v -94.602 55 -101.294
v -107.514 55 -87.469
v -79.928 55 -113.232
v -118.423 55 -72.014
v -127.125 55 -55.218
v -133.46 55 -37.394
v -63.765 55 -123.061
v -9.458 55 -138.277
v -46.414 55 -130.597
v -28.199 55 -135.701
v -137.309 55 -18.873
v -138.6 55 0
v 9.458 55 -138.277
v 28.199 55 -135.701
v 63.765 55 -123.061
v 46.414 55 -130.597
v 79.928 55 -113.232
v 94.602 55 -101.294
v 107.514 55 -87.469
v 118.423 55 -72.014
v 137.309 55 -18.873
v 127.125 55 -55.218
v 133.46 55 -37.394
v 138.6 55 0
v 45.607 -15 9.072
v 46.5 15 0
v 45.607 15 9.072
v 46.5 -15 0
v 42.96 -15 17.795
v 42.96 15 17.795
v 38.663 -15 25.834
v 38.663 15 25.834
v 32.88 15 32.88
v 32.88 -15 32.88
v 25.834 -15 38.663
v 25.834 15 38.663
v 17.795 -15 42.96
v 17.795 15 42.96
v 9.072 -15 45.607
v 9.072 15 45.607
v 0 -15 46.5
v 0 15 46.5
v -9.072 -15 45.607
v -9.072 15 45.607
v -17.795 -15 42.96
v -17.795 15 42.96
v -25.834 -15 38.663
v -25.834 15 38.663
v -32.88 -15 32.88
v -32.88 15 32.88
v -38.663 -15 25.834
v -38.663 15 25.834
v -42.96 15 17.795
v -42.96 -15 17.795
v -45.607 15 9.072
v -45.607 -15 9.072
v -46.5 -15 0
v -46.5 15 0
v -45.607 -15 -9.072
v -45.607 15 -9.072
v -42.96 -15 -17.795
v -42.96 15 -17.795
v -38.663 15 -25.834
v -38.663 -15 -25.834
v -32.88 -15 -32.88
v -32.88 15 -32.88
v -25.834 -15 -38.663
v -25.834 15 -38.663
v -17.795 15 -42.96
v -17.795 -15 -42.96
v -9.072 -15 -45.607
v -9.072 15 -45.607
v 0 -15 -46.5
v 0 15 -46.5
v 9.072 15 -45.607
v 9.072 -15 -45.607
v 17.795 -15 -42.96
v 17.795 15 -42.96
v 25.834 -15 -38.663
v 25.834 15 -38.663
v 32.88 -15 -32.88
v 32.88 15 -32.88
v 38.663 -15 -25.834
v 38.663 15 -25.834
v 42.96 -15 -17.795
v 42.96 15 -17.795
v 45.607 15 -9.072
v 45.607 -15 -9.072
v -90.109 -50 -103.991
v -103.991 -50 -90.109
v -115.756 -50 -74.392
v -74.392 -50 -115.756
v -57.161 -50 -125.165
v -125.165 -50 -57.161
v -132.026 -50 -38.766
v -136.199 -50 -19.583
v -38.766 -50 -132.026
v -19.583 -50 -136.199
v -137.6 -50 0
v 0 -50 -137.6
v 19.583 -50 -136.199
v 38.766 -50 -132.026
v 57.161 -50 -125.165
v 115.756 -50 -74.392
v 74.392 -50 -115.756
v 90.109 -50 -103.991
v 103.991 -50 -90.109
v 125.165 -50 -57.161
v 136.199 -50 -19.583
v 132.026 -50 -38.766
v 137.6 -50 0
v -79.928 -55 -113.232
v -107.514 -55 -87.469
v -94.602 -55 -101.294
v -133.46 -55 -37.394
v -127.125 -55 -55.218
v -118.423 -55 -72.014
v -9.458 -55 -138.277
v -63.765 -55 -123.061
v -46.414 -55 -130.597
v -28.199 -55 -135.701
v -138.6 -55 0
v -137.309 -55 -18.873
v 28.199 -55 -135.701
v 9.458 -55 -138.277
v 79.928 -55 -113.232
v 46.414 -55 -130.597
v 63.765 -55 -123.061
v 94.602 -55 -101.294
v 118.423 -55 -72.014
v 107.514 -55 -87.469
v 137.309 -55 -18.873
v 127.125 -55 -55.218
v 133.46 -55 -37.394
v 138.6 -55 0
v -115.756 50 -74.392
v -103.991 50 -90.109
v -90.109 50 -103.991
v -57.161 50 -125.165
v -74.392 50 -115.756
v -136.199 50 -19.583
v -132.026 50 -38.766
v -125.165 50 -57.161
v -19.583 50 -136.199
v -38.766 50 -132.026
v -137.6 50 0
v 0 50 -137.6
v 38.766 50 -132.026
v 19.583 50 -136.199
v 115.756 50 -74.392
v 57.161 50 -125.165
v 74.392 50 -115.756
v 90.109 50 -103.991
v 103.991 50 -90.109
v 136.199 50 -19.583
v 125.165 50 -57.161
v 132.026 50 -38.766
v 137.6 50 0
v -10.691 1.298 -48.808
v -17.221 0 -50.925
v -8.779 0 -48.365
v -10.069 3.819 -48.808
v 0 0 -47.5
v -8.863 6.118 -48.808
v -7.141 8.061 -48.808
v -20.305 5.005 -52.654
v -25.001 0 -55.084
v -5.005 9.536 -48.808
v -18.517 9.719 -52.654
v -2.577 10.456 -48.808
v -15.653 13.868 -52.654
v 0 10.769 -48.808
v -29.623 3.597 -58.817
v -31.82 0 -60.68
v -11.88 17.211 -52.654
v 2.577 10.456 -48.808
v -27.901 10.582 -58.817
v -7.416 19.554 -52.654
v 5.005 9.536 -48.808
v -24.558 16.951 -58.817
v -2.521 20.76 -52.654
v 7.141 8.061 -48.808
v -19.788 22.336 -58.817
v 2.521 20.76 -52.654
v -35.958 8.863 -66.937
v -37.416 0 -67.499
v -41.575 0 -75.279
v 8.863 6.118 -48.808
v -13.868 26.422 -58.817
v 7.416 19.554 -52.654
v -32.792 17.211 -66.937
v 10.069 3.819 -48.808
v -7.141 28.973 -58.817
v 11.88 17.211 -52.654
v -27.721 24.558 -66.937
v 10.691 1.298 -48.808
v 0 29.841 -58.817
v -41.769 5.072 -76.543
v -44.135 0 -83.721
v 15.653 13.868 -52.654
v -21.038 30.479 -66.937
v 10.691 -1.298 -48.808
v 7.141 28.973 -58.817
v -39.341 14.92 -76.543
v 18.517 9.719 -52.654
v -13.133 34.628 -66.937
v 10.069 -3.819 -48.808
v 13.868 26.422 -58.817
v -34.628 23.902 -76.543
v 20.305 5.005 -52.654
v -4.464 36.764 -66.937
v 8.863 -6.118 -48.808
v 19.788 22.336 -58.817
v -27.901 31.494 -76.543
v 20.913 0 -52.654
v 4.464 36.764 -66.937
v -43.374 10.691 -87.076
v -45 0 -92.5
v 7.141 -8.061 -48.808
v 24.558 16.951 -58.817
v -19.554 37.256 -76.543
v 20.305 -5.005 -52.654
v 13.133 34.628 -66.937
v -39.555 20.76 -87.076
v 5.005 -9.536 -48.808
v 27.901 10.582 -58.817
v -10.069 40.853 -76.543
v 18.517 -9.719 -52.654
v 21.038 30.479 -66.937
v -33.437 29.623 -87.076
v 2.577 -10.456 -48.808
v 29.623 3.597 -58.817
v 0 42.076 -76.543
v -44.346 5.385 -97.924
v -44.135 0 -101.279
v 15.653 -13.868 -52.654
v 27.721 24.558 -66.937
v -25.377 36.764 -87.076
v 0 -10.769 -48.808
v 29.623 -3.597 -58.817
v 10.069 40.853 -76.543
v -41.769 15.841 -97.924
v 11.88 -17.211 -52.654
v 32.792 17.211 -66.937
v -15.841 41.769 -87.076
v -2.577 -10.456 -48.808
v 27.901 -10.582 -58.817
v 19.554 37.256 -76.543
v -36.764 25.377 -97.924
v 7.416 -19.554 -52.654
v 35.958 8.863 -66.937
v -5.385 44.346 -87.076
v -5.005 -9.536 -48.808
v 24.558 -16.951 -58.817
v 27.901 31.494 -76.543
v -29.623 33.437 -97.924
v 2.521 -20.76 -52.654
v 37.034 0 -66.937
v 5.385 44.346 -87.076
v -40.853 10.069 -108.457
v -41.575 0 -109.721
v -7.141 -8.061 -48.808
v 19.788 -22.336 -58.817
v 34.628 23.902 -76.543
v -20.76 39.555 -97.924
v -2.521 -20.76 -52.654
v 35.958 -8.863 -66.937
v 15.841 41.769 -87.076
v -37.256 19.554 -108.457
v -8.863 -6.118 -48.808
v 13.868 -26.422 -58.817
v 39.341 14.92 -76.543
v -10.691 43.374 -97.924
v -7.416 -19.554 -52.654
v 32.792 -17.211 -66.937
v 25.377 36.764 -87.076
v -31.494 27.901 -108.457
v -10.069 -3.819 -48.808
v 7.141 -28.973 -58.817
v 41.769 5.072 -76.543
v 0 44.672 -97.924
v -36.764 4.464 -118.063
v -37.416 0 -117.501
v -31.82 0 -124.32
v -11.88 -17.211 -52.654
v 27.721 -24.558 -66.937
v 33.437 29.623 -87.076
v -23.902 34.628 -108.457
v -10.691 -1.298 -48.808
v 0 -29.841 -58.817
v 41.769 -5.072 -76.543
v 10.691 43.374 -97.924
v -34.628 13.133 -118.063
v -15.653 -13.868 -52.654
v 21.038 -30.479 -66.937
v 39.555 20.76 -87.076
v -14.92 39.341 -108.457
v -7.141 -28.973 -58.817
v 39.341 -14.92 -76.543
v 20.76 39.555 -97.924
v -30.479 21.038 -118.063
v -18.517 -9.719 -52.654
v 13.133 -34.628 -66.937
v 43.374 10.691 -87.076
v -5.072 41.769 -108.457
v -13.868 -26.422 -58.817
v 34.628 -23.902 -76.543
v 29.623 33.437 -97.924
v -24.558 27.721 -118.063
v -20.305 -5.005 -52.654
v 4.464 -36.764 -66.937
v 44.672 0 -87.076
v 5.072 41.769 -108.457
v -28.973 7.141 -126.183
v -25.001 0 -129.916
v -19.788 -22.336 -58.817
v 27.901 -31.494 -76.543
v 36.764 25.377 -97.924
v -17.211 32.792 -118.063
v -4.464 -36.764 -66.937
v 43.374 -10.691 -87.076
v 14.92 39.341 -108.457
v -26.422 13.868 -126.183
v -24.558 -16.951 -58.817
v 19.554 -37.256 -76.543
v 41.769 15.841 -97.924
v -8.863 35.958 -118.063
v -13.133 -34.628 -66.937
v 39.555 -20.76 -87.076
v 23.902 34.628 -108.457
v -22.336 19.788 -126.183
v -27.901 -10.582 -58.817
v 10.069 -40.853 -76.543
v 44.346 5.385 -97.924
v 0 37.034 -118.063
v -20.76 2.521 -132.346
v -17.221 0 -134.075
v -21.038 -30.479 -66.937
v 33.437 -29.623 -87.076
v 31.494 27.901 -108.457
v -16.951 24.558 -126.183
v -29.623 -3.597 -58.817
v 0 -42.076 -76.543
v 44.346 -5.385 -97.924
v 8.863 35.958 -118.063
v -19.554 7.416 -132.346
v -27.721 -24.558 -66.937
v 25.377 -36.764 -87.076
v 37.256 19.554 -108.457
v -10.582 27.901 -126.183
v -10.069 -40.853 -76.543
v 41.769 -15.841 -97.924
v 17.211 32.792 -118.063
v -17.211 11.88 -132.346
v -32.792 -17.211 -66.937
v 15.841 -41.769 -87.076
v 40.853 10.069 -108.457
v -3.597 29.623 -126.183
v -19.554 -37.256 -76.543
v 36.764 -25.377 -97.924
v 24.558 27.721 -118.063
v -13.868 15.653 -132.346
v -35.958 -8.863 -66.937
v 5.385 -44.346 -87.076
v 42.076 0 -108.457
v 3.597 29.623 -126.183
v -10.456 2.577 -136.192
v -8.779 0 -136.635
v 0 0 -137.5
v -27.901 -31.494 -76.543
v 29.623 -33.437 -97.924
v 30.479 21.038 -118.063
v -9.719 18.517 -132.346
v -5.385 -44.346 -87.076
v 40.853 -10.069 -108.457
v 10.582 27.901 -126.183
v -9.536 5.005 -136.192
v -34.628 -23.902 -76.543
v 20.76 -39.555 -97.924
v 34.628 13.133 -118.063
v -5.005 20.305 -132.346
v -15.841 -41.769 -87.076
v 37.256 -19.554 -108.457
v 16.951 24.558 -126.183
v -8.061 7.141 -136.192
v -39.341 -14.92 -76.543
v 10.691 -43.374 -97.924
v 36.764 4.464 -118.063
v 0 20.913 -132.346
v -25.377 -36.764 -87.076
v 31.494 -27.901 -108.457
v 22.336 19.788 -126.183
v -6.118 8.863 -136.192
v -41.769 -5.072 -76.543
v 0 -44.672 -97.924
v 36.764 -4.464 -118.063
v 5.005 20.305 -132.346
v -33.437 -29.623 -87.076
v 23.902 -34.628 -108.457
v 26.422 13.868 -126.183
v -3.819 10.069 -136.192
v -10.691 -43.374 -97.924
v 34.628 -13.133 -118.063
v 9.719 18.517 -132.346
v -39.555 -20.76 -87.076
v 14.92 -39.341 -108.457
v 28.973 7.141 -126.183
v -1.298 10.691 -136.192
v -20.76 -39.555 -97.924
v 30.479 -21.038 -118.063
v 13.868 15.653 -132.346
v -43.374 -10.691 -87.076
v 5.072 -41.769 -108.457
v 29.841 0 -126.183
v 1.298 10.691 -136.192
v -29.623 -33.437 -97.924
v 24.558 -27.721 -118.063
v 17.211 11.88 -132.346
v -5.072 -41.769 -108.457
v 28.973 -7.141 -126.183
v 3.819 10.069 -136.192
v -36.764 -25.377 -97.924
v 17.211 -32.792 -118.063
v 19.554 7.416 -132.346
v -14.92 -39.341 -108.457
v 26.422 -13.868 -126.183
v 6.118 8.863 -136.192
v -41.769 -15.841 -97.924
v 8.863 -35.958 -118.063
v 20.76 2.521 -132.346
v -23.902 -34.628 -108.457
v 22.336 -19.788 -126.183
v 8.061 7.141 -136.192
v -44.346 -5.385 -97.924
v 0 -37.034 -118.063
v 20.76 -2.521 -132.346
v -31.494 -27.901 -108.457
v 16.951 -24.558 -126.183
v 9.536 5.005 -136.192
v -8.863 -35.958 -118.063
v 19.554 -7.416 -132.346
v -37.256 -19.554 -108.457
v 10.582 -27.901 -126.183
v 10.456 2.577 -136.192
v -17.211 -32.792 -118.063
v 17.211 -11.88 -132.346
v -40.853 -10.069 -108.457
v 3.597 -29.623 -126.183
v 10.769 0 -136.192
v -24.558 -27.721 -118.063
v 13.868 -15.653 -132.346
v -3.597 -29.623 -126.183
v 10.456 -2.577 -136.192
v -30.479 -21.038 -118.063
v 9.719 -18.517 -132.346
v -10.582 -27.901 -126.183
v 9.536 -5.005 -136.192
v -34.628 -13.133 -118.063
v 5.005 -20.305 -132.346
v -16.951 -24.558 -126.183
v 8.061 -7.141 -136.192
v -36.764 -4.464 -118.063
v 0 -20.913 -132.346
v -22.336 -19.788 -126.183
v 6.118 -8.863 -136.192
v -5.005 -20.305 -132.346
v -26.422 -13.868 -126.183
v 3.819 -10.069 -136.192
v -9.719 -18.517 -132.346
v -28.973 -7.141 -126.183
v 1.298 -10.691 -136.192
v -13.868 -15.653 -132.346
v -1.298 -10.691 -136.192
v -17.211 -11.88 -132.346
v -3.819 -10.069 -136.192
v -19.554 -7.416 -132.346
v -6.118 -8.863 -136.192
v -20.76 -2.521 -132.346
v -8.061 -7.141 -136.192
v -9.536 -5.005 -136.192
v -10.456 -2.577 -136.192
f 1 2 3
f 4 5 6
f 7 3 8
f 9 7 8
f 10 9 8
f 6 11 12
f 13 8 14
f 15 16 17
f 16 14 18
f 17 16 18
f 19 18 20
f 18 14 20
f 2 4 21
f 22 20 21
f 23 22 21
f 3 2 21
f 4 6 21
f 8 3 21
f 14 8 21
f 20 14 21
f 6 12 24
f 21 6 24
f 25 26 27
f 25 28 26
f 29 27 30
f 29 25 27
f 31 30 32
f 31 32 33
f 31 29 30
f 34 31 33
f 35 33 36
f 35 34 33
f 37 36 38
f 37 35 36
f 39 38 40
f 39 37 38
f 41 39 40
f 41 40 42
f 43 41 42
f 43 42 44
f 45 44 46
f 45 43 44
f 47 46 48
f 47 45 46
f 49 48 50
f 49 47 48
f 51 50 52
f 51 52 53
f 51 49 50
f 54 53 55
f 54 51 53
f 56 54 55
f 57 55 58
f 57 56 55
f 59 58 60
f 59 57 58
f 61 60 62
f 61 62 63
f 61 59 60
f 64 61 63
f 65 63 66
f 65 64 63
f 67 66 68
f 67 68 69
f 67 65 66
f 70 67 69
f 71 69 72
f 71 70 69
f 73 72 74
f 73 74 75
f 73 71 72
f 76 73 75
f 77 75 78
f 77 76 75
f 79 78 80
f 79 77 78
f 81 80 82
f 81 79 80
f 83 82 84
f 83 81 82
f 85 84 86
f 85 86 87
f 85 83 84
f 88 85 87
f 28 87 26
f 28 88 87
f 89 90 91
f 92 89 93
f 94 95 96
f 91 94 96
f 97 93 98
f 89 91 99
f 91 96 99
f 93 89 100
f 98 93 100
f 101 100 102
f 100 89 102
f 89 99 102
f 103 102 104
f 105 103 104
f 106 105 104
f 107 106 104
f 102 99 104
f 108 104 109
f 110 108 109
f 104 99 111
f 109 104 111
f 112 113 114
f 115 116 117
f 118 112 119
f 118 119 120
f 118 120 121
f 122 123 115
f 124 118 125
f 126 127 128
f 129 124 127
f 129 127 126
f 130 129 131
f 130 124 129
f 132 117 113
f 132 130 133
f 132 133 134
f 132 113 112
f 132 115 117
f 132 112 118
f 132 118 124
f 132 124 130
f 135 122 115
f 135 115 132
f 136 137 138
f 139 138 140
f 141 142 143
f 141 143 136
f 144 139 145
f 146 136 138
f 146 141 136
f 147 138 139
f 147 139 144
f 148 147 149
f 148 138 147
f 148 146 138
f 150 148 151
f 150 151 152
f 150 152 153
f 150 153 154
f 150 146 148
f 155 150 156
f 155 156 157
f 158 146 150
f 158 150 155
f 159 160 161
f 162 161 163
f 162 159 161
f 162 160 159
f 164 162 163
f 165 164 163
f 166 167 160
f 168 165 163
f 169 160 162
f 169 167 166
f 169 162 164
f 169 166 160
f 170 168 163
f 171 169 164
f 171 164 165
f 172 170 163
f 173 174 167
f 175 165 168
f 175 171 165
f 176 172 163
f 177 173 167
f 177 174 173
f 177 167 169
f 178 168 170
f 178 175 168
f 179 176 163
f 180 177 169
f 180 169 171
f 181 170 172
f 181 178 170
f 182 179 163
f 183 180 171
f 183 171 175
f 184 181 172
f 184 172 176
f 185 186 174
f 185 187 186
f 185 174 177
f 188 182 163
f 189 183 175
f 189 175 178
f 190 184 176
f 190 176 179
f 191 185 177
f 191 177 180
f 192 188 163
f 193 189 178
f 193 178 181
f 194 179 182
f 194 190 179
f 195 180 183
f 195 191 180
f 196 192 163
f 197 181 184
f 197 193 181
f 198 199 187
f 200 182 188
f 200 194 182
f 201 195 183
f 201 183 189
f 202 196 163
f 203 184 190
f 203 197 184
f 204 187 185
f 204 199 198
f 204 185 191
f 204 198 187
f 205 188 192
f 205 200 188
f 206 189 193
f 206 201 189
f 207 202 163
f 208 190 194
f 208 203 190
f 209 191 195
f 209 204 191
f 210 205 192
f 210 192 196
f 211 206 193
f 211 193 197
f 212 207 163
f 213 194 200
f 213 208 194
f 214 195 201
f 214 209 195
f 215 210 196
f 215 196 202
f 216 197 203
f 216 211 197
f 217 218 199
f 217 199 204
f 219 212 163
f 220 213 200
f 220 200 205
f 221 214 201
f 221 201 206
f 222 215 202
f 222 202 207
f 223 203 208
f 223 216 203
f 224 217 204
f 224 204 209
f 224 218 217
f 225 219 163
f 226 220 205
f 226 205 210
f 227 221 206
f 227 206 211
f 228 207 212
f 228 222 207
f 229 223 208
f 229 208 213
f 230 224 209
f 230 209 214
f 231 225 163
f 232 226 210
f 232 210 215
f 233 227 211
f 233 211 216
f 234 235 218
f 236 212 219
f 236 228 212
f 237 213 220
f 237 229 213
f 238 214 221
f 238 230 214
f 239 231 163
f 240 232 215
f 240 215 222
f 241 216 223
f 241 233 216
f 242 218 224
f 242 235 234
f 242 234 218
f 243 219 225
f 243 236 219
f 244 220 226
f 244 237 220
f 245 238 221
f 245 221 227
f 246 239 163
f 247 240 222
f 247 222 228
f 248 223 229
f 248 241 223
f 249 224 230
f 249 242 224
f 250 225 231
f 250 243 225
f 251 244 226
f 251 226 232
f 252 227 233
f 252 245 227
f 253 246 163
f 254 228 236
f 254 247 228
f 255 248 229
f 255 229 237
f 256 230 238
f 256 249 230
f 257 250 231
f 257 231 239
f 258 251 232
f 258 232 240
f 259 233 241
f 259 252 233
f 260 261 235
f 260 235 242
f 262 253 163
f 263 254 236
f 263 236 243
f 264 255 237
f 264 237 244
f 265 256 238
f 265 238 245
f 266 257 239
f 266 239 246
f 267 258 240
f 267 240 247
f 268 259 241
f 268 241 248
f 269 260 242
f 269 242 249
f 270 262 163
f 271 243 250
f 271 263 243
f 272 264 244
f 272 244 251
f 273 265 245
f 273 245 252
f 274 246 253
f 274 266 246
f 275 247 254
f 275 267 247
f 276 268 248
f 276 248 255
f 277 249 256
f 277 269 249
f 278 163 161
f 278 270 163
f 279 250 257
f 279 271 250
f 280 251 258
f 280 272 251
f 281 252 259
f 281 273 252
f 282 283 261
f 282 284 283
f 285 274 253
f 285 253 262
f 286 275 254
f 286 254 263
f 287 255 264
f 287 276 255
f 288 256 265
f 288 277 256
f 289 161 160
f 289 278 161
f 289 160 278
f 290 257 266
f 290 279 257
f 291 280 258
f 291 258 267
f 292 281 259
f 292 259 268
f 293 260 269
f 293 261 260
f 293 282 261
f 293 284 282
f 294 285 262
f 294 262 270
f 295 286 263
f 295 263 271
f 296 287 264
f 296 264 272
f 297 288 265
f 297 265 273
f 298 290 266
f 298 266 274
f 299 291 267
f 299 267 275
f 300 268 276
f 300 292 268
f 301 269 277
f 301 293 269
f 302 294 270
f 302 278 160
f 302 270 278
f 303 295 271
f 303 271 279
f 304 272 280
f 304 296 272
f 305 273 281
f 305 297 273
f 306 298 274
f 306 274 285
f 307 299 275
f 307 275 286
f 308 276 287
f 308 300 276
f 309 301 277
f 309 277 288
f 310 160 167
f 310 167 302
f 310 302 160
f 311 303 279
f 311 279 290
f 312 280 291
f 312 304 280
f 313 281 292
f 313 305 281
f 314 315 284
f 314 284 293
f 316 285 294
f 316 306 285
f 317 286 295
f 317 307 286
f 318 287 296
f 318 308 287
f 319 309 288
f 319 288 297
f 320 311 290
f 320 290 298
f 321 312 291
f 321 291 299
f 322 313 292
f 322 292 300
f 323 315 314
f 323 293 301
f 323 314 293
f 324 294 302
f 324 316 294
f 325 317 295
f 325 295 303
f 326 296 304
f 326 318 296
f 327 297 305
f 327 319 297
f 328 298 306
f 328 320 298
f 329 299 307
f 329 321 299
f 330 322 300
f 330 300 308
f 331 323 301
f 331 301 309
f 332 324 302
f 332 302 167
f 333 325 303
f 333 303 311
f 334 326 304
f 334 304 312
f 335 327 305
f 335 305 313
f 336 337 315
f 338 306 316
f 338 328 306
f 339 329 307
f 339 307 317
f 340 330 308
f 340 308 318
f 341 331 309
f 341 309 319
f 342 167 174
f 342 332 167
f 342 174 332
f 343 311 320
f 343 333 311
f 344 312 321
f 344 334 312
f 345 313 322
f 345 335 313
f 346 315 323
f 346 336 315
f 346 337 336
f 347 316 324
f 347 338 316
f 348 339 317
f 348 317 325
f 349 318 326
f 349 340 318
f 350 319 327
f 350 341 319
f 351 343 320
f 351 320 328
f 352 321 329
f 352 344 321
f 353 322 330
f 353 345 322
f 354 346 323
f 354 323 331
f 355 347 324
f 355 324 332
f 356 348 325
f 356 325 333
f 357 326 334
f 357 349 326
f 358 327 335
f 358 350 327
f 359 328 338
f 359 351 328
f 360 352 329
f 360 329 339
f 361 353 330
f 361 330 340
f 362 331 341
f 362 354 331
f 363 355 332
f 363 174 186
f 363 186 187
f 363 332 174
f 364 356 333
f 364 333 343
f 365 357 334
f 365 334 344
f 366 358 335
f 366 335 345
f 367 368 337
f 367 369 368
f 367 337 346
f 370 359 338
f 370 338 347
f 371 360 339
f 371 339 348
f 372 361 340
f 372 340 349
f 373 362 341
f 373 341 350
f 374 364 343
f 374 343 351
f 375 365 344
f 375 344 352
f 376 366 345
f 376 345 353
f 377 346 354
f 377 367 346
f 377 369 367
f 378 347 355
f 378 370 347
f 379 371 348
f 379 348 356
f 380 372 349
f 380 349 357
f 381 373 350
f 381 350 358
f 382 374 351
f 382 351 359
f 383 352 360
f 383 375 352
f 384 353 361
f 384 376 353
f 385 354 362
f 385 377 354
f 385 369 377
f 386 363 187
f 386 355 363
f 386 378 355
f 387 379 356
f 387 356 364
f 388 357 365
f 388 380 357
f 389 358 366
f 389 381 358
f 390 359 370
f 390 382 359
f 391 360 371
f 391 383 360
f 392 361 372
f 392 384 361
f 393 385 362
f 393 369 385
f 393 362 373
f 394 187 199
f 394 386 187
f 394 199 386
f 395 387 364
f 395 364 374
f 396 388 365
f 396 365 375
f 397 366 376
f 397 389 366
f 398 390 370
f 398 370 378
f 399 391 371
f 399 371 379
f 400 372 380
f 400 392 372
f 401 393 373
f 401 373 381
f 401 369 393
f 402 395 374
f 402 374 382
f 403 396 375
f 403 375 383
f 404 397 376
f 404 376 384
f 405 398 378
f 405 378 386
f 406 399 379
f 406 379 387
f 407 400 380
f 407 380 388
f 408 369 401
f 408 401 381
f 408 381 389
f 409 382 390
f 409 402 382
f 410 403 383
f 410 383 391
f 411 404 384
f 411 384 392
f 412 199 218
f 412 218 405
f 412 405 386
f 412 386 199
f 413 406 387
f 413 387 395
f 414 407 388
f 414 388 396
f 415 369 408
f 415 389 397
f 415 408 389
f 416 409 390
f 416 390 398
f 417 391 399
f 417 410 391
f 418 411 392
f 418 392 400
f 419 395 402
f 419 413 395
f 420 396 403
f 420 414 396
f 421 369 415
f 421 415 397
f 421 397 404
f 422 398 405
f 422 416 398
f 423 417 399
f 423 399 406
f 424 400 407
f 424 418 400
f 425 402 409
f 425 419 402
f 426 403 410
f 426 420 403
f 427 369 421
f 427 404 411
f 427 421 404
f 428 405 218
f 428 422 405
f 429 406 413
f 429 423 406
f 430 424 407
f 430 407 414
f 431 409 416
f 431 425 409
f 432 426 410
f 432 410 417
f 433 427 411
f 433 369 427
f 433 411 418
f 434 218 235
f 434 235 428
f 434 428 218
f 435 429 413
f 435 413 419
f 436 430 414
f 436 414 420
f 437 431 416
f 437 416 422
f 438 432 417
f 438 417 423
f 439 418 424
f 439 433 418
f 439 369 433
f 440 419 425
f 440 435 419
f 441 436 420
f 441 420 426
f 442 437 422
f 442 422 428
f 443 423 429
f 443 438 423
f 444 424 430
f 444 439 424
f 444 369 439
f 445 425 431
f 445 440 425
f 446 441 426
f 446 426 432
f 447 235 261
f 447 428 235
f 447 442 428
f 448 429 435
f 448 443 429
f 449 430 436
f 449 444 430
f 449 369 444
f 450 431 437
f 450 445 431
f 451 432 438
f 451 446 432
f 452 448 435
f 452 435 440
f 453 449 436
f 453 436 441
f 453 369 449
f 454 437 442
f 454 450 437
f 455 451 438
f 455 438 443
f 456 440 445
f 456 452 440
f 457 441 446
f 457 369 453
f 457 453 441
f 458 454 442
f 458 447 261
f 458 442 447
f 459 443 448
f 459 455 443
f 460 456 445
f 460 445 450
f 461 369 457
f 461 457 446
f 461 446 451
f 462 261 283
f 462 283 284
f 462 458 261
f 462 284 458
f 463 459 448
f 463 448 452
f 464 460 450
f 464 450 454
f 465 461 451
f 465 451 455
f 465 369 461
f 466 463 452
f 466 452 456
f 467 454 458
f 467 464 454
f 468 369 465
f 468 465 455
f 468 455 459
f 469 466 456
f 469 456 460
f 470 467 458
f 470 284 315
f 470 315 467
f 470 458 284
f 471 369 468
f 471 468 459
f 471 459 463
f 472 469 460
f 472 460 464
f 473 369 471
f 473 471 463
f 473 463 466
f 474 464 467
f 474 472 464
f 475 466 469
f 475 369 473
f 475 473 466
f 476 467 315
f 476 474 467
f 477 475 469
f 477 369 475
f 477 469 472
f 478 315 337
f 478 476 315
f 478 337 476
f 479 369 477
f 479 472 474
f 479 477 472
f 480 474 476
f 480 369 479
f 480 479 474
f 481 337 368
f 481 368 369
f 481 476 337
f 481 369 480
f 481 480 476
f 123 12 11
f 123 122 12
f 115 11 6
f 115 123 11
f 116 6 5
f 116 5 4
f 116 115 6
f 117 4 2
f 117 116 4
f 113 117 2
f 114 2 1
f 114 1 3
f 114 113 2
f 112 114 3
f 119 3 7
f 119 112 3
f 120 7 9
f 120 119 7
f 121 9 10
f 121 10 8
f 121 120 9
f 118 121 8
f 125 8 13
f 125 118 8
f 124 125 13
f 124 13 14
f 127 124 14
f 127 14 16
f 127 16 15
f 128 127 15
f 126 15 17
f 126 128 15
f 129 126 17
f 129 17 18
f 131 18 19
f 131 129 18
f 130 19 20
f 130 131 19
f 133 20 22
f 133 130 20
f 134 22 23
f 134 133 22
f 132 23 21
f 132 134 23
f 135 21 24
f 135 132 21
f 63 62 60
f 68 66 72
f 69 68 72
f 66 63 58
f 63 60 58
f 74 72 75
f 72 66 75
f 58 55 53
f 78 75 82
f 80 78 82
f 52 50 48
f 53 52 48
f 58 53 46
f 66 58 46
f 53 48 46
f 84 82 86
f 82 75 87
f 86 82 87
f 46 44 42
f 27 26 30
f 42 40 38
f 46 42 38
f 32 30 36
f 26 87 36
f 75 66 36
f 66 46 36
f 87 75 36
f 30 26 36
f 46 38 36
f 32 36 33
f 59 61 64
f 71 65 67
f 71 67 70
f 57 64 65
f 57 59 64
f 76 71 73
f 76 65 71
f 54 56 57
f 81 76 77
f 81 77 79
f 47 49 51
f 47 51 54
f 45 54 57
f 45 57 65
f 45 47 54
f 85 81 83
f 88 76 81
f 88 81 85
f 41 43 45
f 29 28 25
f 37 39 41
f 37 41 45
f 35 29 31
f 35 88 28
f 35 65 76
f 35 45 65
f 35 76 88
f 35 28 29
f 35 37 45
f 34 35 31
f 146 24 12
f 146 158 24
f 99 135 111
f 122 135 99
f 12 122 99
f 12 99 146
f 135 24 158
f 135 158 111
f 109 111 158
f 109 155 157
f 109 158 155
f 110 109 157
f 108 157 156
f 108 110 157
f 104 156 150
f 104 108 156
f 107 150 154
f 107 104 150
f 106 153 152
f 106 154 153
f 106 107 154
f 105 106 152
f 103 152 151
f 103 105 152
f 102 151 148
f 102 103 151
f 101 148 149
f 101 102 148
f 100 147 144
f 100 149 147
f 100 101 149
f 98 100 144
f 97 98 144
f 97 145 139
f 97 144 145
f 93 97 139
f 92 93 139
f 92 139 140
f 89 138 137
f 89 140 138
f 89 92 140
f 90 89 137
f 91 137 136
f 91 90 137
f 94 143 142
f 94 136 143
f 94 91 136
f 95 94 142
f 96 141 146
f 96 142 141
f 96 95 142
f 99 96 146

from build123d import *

# Parameters (mm, degrees)
F0_R     = 46.5
F1_DEPTH = 15
F4_DEPTH = 55
F5_START = 50
F5_DEPTH = 5
F6_START = -50
F6_DEPTH = 5


with BuildPart() as f1:
    # F0 (on Front) → F1 (new body, symmetric)
    with BuildSketch(Plane.XZ):
        Circle(F0_R)
    extrude(amount=F1_DEPTH, both=True)


with BuildPart() as f3:
    # F2 (on Front) → F3 (revolve)
    with BuildSketch(Plane.XZ):
        with BuildLine():
            Line((0, -137.5), (0, -47.5))
            ThreePointArc((0, -47.5), (-45, -92.5), (0, -137.5))
        make_face()
    revolve(axis=Axis((0, 0, -92.5), (0, 0, -1)))


with BuildPart() as f4:
    # F2 (on Front) → F4 (new body, symmetric)
    with BuildSketch(Plane.XZ):
        with BuildLine():
            Line((138.6, 0), (137.6, 0))
            ThreePointArc((137.6, 0), (0, -137.6), (-137.6, 0))
            Line((-137.6, 0), (-138.6, 0))
            ThreePointArc((-138.6, 0), (0, -138.6), (138.6, 0))
        make_face()
    extrude(amount=F4_DEPTH, both=True)

    # F2 (on Front) → F5 (join)
    with BuildSketch(Plane.XZ.offset(F5_START)):
        with BuildLine():
            ThreePointArc((-137.6, 0), (0, -137.6), (137.6, 0))
            Line((137.6, 0), (0, 0))
            Line((0, 0), (-137.6, 0))
        make_face()
        with BuildLine():
            ThreePointArc((0, -47.5), (31.8198051534, -60.6801948466), (45, -92.5))
            ThreePointArc((45, -92.5), (31.8198051534, -124.3198051534), (0, -137.5))
            ThreePointArc((0, -137.5), (-45, -92.5), (0, -47.5))
        make_face(mode=Mode.SUBTRACT)
        with BuildLine():
            ThreePointArc((0, -137.5), (31.8198051534, -124.3198051534), (45, -92.5))
            ThreePointArc((45, -92.5), (31.8198051534, -60.6801948466), (0, -47.5))
            Line((0, -47.5), (0, -137.5))
        make_face()
        with BuildLine():
            Line((0, -137.5), (0, -47.5))
            ThreePointArc((0, -47.5), (-45, -92.5), (0, -137.5))
        make_face()
    extrude(amount=F5_DEPTH)

    # F2 (on Front) → F6 (join)
    with BuildSketch(Plane.XZ.offset(F6_START)):
        with BuildLine():
            ThreePointArc((-137.6, 0), (0, -137.6), (137.6, 0))
            Line((137.6, 0), (0, 0))
            Line((0, 0), (-137.6, 0))
        make_face()
        with BuildLine():
            ThreePointArc((0, -47.5), (31.8198051534, -60.6801948466), (45, -92.5))
            ThreePointArc((45, -92.5), (31.8198051534, -124.3198051534), (0, -137.5))
            ThreePointArc((0, -137.5), (-45, -92.5), (0, -47.5))
        make_face(mode=Mode.SUBTRACT)
        with BuildLine():
            ThreePointArc((0, -137.5), (31.8198051534, -124.3198051534), (45, -92.5))
            ThreePointArc((45, -92.5), (31.8198051534, -60.6801948466), (0, -47.5))
            Line((0, -47.5), (0, -137.5))
        make_face()
        with BuildLine():
            Line((0, -137.5), (0, -47.5))
            ThreePointArc((0, -47.5), (-45, -92.5), (0, -137.5))
        make_face()
    extrude(amount=-F6_DEPTH)


solid = Compound([f1.part, f3.part, f4.part])
